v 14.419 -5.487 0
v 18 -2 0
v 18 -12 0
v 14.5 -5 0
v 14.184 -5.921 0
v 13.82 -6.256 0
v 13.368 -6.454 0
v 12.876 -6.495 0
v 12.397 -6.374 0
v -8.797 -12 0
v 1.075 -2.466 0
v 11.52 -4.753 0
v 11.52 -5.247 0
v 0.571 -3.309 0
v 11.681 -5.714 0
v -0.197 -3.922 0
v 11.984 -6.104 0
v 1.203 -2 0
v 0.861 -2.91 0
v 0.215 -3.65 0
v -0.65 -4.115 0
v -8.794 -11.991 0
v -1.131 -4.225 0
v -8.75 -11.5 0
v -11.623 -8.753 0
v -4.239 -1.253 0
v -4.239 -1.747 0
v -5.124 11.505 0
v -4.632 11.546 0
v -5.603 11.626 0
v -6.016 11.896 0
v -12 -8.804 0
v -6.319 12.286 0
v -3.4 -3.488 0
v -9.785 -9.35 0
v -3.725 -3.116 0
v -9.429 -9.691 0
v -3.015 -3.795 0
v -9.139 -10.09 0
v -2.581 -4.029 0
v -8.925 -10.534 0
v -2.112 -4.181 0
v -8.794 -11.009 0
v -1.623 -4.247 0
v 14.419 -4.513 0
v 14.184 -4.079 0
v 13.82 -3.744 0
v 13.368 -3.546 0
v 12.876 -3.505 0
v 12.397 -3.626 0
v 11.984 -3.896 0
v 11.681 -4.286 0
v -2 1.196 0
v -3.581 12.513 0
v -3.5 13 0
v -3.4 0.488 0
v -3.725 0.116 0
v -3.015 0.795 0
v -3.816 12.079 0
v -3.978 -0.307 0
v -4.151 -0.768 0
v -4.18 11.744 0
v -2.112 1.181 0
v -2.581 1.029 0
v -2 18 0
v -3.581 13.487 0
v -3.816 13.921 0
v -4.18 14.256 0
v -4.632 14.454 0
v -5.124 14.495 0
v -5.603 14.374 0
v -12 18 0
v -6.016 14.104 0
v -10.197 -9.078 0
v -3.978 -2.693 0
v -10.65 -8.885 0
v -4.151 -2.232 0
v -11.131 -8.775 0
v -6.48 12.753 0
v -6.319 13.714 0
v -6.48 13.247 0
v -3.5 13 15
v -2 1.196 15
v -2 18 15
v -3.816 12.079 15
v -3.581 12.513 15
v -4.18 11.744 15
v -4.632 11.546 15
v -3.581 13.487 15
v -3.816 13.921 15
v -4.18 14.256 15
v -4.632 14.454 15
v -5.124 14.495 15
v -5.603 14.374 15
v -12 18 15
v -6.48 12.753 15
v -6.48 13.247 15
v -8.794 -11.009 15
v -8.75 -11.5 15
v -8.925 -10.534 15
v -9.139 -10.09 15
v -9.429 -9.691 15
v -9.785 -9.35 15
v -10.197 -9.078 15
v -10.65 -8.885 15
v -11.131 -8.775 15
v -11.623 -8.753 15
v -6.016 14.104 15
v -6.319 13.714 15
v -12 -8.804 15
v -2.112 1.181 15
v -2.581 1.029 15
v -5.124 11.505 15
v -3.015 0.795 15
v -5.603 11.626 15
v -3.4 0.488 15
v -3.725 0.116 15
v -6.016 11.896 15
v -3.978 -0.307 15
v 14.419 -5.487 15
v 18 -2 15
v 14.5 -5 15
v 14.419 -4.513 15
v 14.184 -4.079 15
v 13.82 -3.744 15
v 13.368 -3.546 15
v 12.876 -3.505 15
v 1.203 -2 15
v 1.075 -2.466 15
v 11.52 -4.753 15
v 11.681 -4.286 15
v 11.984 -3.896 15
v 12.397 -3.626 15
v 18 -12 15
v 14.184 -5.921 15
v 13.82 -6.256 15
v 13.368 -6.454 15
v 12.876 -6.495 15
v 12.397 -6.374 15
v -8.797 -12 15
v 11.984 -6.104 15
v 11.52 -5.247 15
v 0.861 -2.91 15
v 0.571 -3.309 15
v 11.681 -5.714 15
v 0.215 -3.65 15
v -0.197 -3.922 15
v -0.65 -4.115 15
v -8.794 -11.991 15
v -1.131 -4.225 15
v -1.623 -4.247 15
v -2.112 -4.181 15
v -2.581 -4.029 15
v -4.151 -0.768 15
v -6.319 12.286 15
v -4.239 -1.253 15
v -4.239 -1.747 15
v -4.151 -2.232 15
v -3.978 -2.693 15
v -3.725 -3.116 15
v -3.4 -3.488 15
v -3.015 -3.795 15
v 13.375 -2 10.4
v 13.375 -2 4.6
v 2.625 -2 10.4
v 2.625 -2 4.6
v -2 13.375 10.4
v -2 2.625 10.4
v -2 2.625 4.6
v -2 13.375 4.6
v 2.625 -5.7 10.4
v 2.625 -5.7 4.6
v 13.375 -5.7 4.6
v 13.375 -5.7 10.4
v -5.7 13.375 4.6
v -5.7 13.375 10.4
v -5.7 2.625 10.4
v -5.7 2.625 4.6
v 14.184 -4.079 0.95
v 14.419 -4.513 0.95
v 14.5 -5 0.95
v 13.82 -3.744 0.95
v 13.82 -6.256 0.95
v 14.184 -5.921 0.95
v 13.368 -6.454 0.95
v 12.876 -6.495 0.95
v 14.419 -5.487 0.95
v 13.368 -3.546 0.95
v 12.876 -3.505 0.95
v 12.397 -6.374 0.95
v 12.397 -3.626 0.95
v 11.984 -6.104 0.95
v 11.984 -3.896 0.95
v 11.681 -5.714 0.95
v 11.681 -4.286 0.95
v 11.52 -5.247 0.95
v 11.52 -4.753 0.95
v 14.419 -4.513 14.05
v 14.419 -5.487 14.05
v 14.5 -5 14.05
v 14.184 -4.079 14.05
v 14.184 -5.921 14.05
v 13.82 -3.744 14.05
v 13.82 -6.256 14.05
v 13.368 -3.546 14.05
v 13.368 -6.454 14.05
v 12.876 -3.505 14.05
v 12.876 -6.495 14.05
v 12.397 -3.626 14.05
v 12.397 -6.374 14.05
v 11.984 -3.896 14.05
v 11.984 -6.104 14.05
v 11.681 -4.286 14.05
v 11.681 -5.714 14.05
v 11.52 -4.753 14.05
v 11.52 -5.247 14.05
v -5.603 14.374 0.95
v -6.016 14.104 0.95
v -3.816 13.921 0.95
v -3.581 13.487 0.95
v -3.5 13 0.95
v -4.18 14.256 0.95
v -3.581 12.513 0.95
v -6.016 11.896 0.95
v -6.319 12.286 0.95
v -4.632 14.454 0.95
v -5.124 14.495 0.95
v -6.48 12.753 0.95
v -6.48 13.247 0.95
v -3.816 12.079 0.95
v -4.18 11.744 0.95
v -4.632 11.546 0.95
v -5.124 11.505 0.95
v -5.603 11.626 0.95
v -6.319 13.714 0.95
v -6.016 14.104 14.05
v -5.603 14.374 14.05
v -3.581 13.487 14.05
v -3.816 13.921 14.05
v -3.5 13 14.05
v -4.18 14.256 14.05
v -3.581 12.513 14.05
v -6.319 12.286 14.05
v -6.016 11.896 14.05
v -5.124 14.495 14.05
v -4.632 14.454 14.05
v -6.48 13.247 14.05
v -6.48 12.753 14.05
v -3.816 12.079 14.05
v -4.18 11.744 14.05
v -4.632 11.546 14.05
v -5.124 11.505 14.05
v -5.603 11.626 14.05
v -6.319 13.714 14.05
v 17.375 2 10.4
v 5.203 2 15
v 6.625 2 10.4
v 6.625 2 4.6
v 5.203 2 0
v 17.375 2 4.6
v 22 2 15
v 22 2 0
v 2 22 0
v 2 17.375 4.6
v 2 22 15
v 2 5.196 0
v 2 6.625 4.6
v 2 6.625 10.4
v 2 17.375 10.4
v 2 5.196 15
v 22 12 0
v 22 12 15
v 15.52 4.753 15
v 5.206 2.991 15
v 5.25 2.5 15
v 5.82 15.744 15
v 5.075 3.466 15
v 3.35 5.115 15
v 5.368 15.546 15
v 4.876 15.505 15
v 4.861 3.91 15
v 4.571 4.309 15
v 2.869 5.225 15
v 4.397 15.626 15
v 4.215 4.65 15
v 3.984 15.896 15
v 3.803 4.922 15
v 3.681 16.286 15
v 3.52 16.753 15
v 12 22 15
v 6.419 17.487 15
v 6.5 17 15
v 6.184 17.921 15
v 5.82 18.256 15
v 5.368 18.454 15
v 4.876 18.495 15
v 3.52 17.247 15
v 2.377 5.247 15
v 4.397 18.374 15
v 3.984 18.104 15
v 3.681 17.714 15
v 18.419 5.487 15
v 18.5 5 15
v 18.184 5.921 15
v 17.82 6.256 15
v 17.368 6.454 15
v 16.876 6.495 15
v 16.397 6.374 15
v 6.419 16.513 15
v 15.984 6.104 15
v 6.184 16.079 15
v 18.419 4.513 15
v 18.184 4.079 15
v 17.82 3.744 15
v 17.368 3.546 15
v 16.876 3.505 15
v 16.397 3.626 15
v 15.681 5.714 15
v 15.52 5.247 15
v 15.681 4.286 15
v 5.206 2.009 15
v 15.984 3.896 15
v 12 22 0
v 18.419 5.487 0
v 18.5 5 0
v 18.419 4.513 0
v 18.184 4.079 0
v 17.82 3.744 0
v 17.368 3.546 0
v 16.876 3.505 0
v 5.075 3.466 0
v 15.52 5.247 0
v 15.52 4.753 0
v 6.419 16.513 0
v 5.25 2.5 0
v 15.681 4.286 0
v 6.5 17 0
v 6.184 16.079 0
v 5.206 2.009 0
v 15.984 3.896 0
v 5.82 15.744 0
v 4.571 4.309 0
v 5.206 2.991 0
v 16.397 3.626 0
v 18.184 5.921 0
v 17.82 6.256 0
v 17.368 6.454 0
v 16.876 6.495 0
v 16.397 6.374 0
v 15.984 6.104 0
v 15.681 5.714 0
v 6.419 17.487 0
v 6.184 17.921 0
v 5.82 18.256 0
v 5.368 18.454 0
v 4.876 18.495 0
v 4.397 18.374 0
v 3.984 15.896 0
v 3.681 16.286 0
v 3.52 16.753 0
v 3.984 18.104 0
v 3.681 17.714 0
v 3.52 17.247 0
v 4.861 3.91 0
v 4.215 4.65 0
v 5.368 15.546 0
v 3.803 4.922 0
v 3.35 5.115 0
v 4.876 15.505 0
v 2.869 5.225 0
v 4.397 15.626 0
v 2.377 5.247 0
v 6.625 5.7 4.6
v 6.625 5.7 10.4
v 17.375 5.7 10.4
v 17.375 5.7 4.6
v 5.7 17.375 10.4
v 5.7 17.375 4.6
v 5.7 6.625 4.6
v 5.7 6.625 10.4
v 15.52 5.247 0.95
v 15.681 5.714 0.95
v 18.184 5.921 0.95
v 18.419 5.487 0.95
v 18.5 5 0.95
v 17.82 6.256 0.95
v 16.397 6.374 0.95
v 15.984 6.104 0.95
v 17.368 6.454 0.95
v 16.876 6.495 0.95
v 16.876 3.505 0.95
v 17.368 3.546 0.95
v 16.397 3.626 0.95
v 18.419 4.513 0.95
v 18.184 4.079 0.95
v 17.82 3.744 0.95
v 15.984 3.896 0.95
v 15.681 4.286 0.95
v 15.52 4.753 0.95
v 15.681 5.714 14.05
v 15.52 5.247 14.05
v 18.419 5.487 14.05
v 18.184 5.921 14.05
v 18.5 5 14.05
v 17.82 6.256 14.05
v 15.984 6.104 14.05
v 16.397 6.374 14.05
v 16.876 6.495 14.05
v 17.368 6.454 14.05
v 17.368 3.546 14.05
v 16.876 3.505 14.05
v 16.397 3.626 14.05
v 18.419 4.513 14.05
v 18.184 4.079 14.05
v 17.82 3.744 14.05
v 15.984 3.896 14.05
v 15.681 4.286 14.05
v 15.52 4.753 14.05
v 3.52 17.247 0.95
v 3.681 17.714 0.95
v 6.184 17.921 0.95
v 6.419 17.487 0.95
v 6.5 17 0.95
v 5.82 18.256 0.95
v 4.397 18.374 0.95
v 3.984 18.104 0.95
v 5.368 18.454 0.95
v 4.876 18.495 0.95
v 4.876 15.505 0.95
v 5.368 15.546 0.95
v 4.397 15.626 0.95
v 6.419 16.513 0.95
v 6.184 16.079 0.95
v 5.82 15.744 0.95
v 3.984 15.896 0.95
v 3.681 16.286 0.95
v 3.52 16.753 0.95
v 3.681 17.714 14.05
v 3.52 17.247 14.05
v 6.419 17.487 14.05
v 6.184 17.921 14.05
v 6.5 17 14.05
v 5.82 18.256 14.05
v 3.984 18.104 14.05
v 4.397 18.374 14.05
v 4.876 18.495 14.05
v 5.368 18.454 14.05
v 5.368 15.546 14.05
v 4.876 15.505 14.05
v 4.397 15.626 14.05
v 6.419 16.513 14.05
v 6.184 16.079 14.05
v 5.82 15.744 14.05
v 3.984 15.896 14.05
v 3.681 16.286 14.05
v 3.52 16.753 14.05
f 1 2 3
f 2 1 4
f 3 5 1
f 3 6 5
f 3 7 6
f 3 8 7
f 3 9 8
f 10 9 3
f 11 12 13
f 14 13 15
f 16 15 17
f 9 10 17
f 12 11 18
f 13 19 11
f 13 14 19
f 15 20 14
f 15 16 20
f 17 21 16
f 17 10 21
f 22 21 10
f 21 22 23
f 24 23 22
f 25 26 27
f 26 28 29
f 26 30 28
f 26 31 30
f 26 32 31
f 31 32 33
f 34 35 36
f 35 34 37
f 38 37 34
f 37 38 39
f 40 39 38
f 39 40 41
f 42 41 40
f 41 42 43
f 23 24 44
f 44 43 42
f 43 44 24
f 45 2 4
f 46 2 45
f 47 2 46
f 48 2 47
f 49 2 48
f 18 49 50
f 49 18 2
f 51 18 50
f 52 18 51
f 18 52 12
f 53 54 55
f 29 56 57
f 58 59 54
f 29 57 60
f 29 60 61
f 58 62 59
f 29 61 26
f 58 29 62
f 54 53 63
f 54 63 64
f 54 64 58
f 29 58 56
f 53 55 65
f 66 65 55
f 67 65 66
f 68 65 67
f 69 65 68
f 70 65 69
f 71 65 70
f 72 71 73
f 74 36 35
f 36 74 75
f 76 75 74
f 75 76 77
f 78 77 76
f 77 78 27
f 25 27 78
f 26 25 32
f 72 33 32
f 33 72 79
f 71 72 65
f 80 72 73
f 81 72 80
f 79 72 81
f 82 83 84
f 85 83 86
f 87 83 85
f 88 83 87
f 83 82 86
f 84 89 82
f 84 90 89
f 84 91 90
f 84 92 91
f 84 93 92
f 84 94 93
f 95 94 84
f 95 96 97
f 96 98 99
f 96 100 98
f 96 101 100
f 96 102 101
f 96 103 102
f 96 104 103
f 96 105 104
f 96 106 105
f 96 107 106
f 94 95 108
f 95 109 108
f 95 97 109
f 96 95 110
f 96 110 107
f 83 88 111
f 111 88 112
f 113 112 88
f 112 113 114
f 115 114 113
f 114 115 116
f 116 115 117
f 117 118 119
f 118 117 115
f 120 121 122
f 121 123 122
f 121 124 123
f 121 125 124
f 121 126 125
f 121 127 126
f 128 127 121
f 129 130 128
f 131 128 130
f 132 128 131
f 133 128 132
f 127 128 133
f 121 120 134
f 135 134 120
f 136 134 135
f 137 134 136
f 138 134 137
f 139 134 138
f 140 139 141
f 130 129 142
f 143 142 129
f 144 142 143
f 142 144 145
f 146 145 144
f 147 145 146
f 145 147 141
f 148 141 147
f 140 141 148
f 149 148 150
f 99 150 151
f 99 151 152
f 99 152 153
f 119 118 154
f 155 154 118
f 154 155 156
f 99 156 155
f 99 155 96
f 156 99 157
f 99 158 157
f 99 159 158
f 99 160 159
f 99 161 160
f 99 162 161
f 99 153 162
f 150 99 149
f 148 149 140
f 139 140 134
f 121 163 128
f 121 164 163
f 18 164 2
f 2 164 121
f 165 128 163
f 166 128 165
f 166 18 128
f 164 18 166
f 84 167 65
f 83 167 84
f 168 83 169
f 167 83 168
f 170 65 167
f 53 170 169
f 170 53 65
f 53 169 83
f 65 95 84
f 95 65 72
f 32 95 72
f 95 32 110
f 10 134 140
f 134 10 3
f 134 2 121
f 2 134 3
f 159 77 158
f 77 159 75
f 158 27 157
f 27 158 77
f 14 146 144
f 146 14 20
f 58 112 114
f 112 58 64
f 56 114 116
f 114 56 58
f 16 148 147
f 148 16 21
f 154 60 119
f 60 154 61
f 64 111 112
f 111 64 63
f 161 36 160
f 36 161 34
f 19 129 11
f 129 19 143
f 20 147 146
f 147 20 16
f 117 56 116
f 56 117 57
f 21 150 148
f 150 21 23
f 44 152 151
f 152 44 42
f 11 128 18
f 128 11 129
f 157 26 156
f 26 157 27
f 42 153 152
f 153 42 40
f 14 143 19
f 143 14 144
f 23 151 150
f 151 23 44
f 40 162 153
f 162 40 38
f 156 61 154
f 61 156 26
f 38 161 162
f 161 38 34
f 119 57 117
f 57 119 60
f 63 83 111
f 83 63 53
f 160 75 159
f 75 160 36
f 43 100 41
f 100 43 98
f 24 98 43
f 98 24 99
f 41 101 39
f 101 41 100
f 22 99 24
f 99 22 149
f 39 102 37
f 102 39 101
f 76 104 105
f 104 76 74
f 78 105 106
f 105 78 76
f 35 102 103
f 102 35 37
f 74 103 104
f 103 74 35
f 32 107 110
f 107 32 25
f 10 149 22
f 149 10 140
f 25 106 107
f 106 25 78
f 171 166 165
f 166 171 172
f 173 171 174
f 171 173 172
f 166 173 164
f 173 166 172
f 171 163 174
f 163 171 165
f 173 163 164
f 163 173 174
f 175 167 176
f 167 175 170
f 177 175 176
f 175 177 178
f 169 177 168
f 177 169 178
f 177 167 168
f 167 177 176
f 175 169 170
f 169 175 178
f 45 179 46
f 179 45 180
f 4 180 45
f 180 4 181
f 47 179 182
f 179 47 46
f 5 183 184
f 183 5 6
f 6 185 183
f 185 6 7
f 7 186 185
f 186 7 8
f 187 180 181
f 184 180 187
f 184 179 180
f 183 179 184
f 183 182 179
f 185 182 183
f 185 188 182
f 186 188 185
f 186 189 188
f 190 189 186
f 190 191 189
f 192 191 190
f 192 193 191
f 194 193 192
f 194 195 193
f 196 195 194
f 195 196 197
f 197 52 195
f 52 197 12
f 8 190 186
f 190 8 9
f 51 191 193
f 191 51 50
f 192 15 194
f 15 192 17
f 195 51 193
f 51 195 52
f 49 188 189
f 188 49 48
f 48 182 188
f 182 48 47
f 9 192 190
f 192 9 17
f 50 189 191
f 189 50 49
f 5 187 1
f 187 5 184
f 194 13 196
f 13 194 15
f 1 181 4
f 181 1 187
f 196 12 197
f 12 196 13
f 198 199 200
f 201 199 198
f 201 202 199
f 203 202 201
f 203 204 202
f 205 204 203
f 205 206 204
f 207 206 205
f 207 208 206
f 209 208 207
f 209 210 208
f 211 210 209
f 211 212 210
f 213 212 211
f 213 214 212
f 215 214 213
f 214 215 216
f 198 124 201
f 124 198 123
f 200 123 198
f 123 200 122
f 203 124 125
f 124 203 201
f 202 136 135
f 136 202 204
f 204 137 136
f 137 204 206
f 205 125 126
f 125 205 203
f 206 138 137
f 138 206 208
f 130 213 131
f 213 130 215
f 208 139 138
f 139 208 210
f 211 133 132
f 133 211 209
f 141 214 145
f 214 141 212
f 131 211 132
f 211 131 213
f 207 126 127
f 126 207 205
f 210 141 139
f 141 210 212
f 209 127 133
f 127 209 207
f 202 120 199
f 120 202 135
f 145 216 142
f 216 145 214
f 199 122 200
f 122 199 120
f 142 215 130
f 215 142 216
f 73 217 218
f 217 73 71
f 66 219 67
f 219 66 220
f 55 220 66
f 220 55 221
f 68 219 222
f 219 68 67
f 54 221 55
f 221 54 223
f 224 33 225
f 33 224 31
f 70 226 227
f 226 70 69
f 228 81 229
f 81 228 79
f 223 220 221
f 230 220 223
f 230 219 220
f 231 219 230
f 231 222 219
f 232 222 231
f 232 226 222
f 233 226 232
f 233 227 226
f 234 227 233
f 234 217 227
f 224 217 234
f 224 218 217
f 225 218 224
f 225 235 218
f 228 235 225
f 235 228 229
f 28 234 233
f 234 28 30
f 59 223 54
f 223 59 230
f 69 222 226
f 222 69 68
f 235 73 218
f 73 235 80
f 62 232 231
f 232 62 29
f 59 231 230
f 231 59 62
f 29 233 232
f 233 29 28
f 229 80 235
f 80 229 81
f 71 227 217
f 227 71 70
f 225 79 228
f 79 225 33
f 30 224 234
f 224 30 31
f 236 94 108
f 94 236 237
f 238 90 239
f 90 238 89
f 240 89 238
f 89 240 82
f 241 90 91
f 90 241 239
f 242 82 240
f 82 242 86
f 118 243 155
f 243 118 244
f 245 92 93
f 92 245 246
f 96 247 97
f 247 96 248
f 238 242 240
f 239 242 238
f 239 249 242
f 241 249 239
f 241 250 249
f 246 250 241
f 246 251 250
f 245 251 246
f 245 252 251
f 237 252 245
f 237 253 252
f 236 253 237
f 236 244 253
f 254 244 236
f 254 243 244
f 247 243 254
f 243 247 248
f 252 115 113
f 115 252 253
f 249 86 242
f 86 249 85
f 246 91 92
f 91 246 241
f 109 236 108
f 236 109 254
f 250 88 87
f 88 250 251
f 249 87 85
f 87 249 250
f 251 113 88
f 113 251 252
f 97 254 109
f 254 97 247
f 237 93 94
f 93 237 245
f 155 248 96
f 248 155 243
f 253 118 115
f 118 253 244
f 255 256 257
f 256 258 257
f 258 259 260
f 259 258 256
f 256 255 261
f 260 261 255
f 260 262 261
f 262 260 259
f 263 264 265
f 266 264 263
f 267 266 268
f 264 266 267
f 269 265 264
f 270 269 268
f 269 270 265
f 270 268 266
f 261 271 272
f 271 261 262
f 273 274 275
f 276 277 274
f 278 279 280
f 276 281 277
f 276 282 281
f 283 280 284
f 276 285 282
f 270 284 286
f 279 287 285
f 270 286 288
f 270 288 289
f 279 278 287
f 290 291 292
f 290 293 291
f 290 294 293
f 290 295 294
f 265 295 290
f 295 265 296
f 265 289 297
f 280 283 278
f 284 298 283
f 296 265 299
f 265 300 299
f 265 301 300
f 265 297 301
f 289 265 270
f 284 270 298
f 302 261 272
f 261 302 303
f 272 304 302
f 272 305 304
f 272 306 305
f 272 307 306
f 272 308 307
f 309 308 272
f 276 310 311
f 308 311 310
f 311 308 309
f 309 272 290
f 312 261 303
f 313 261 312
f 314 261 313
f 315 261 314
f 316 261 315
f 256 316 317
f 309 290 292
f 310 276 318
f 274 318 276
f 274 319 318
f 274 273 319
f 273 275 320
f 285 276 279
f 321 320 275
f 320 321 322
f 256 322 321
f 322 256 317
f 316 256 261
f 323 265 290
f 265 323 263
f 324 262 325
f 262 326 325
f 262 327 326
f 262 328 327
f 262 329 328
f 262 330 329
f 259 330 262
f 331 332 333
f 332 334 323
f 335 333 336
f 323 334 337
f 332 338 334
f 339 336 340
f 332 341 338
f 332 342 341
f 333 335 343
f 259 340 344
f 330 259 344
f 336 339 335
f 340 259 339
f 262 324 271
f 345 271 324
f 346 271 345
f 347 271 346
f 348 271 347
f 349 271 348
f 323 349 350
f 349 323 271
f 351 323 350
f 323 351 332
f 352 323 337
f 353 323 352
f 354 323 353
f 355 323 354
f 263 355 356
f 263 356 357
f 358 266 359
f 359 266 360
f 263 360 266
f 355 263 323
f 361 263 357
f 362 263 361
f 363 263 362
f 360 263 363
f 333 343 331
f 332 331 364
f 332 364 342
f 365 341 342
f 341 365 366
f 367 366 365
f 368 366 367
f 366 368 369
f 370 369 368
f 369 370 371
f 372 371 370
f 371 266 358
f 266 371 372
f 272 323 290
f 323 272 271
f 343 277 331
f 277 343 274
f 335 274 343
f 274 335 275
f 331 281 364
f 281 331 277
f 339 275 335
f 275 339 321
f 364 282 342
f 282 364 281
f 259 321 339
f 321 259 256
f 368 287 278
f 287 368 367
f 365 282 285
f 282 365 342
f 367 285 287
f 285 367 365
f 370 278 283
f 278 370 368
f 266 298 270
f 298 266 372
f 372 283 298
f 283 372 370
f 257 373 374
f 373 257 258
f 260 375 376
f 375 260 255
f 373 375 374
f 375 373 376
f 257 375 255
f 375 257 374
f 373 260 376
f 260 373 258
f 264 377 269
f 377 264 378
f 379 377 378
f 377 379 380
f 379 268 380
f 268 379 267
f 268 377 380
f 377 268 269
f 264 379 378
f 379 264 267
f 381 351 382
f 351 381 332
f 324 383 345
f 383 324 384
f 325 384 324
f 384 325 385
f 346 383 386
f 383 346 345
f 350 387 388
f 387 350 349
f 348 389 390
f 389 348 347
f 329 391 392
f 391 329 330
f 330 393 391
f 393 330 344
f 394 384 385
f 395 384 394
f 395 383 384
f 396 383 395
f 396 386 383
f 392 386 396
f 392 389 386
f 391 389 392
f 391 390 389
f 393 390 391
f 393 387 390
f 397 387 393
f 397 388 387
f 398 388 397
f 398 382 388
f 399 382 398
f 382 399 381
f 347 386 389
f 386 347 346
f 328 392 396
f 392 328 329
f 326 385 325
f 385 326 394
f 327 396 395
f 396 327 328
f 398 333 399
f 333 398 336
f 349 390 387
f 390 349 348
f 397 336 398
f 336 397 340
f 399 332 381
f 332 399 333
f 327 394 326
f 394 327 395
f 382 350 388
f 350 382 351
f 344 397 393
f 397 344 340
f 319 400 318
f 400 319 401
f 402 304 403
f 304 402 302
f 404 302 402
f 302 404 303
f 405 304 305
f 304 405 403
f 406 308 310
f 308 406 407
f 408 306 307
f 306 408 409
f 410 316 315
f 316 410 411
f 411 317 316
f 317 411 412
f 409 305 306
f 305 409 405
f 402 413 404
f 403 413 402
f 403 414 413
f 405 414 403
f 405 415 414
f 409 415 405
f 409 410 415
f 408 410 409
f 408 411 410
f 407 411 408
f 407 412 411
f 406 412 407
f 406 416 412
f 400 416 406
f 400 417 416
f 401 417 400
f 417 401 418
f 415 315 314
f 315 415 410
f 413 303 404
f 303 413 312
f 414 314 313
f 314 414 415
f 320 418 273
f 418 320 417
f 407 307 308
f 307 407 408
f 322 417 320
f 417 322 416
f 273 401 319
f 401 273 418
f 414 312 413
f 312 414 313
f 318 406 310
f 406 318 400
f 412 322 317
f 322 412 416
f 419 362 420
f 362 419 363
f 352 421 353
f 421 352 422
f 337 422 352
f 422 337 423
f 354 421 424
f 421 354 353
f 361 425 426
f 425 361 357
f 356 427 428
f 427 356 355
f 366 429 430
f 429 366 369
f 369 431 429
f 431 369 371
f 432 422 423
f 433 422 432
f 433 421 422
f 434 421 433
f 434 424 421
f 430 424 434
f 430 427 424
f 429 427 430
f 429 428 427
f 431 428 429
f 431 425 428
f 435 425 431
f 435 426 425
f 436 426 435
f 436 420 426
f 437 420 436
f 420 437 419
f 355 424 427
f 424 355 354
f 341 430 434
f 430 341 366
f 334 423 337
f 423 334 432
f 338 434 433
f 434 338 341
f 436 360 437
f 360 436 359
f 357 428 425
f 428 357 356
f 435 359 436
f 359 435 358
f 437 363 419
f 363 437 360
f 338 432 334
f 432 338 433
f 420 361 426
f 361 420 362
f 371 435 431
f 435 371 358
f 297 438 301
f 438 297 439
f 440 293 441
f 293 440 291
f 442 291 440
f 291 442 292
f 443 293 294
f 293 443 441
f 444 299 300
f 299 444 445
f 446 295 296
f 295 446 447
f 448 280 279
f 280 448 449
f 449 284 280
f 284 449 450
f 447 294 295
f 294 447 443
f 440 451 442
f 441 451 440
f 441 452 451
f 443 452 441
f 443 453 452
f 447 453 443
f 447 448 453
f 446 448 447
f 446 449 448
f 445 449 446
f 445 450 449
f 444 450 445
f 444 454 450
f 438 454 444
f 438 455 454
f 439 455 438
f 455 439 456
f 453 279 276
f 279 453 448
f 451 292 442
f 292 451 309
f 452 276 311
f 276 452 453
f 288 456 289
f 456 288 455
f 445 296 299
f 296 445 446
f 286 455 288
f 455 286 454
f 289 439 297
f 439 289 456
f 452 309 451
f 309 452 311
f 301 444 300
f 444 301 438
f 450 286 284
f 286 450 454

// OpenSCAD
//#############################################################################
//
// Customizable magnetic squares
// =============================
//
// These little tools are very useful for paper, card or plastic modelling
// where pieces need to be attached upright or at ninety degree angles.
//
// Two shapes can be printed: an L-shaped square, and a rectangle shaped one.
// Given the same input dimensions, the rectangle shaped part fits precisely
// into the corner of the L-shaped square.
//
// The magnetic squares can be printed in different sizes, depending
// on your particular need. Both disc and rectangle shaped magnets of
// configurable dimensions are supported.
//
// It is important to alternate the polarity of the magnet between the x and
// y direction of the magnetic square so that any combination of squares 
// can be used together.
// Use the small recess dots modelled into the magnetic square to indicate
// polarity with a drop of paint.
//
// The magnets are best secured with epoxy. 
//
//
// Author: LANEBoysRC <laneboysrc@gmail.com>
// Licensed under the Creative Commons - Attribution license. 
// http://creativecommons.org/licenses/by/3.0/
//
//#############################################################################

/* [Part shape] */

// dimension of the magnetic square:
x = 20;     // [20:20:200]

// dimension of the magnetic square:
y = 20;     // [20:20:200]

// of the magnetic square:
thickness = 15; 

// of the "arm" of the magnetic square. 
width = 10;

// of the magnetic square (square: L-shaped, clamp: rectangle with chamfered back)
type = "both"; // [square, clamp, both]

/* [Magnet] */

magnet_shape = "rectangle"; // [disc, rectangle]

// Magnet dimensions
magnet_x = 10;

// (ignored for disc shaped magnets)
magnet_y = 5;

magnet_z = 3;

/* [Advanced options] */

// Distance between two magnets
magnet_spacing = 20;

// If set to yes, magnets are also placed on the outside of the L-shaped part
magnets_on_the_outside = "no"; // [yes, no]

// Diameter of the corner relief. Set to zero for no relief.
relief_d = 5.5;

// Determines how much the center of the relief cylinder is shifted in x and y
relief_offset = 0.5;


/* [Hidden] */
dim = [x, y, thickness, width];

magnet_dim = [magnet_x, magnet_y, magnet_z];
magnet_offset = magnet_spacing / 2;

// Clearance around the magnet in x, y, z dimensions
magnet_clearance = [0.75, 0.75, 0.75];   

marker_d = 3;           // Dots that allow marking north/south of the magnets with paint
marker_h = 1;
marker_inset = 5;

// Clamp width to a sensible value
sensible_width = min(dim.x, dim.y, max(dim[3], relief_d));

$fa = 1;
$fs = 0.5;

eps = 0.05;
eps2 = 2 * eps;

if (type == "both") {
    translate([-2, -2, 0]) part(dim=dim, type="square", width=sensible_width);
    translate([2, 2, 0])part(dim=dim, type="clamp", width=sensible_width);
}
else {
    part(dim=dim, type=type, width=sensible_width);
}


//#############################################################################
// Rotates the children onto the xz plane.
module xz(dim)
{
    rotate([90, 0, 0]) translate([0, 0, -dim.z]) children();
}

//#############################################################################
// Rotates the children onto the yz plane.
module yz(dim)
{
    rotate([90, 0, 90]) translate([0, 0, 0]) children();
}

//#############################################################################
module part(type="square", dim=[30, 30, 10], width=10) 
{
    if (type == "square") {
        magnetic_square(dim, width);
    }
    else if (type == "clamp") {
        magnetic_clamp(dim, width);
    }
    else {
        %color("red") text("error: type must be 'square' or 'clamp'");
    }
}

//#############################################################################
module magnet_recess()
{
    if (magnet_shape == "disc") {
        r_d = magnet_recessDim().x;
        r_h = magnet_recessDim().z;
        cylinder(d=r_d, h=r_h);
    }
    else if (magnet_shape == "rectangle") {
        m = magnet_recessDim();
        translate([-m.x/2, -m.y/2, 0])
            cube(m);
    }
    else {
        %color("red") text("error: magnet_shape must be 'disc' or 'rectangle'");
    }
}

function magnet_recessDim(location="") =
    location == "" ? magnet_dim + magnet_clearance + [0, eps, 0] :
    "Error";

//#############################################################################
module marker_recess()
{
    r_d = marker_recessDim().x;
    r_h = marker_recessDim().z;
    cylinder(d=r_d, h=r_h);
}

function marker_recessDim(location="") =
    location == "" ? [marker_d, marker_d, marker_h] :
    "Error";

//#############################################################################
module magnetic_square(dim, width) 
{
    // Define the outside shape 
    // Note that the dimensions refer to the inner side of the square
    // so we position the inner side at 0/0
    points = [
        [-width, -width],
        [dim.x, -width],
        [dim.x, 0],
        [0, 0],
        [0,  dim.y],
        [-width, dim.y]
    ];
    
    difference() {
        // Basic outside shape
        linear_extrude(dim.z) polygon(points);
        
        // Relief at the origin
        ro = [relief_offset, relief_offset, -eps];
        translate(ro)
            cylinder(d=relief_d, h=dim.z+eps2);
        
        // Relief in the outer corner
        translate(ro + [-width, -width, 0])
            cylinder(d=relief_d, h=dim.z+eps2);
        
        // Magnets
        mr = magnet_recessDim();
        posX = [magnet_offset, -mr.z + eps, dim.z/2];
        n_magnets_x = (dim.x - magnet_offset - mr.x/2 - 1) / magnet_spacing;
        for (i = [0:n_magnets_x]) {
            translate(posX + [i * magnet_spacing, 0, 0])
                xz(mr) magnet_recess();
        }

        posY = [-mr.z + eps, magnet_offset, dim.z/2];
        n_magnets_y = (dim.y - magnet_offset - mr.x/2 - 1) / magnet_spacing;
        for (i = [0:n_magnets_y]) {
            translate(posY + [0, i * magnet_spacing, 0])
                yz(mr) magnet_recess();
        }

        if (magnets_on_the_outside == "yes") {
            posX = [-width + magnet_offset, -width - eps, dim.z/2];
            n_magnets_x = (dim.x + width - magnet_offset - mr.x/2 - 1) / magnet_spacing;
            for (i = [0:n_magnets_x]) {
                translate(posX + [i * magnet_spacing, 0, 0])
                    xz(mr) magnet_recess();
            }

            posY = [-width - eps, -width + magnet_offset, dim.z/2];
            n_magnets_y = (dim.y + width - magnet_offset - mr.x/2 - 1) / magnet_spacing;
            for (i = [0:n_magnets_y]) {
                translate(posY + [0, i * magnet_spacing, 0])
                    yz(mr) magnet_recess();
            }
        }

        // Magnet polarity markers
        mox_x = dim.x - marker_inset;
        mox_y = -marker_recessDim().y;
        translate([mox_x, mox_y, -eps])
            marker_recess();
        translate([mox_x, mox_y, dim.z-marker_recessDim().z+eps])
            marker_recess();

        moy_x = -marker_recessDim().x;
        moy_y = dim.y - marker_inset;
        translate([moy_x, moy_y, -eps])
            marker_recess();
        translate([moy_x, moy_y, dim.z-marker_recessDim().z+eps])
            marker_recess();
    }
}

//#############################################################################
module magnetic_clamp(dim, width) 
{
    points = [
        [0, 0],
        [dim.x, 0],
        [dim.x, width],
        [width, dim.y],
        [0, dim.y]
    ];

    difference() {
        // Basic outside shape
        linear_extrude(dim.z) polygon(points);
        
        // Relief at the origin
        translate([relief_offset, relief_offset, -eps])
            cylinder(d=relief_d, h=dim.z+eps2);
        
        // Magnets
        mr = magnet_recessDim();
        posX = [magnet_offset, -eps, dim.z/2];
        n_magnets_x = (dim.x - magnet_offset - mr.x/2 - 1) / magnet_spacing;
        for (i = [0:n_magnets_x]) {
            translate(posX + [i * magnet_spacing, 0, 0])
                xz(mr) magnet_recess();
        }

        posY = [-eps, magnet_offset, dim.z/2];
        n_magnets_y = (dim.y - magnet_offset - mr.x/2 - 1) / magnet_spacing;
        for (i = [0:n_magnets_y]) {
            translate(posY + [0, i * magnet_spacing, 0])
                yz(mr) magnet_recess();
        }

        // Magnet polarity markers
        mox_x = dim.x - marker_inset;
        mox_y = marker_recessDim().y;
        translate([mox_x, mox_y, -eps])
            marker_recess();
        translate([mox_x, mox_y, dim.z-marker_recessDim().z+eps])
            marker_recess();

        moy_x = marker_recessDim().x;
        moy_y = dim.y - marker_inset;
        translate([moy_x, moy_y, -eps])
            marker_recess();
        translate([moy_x, moy_y, dim.z-marker_recessDim().z+eps])
            marker_recess();
   }    
}
